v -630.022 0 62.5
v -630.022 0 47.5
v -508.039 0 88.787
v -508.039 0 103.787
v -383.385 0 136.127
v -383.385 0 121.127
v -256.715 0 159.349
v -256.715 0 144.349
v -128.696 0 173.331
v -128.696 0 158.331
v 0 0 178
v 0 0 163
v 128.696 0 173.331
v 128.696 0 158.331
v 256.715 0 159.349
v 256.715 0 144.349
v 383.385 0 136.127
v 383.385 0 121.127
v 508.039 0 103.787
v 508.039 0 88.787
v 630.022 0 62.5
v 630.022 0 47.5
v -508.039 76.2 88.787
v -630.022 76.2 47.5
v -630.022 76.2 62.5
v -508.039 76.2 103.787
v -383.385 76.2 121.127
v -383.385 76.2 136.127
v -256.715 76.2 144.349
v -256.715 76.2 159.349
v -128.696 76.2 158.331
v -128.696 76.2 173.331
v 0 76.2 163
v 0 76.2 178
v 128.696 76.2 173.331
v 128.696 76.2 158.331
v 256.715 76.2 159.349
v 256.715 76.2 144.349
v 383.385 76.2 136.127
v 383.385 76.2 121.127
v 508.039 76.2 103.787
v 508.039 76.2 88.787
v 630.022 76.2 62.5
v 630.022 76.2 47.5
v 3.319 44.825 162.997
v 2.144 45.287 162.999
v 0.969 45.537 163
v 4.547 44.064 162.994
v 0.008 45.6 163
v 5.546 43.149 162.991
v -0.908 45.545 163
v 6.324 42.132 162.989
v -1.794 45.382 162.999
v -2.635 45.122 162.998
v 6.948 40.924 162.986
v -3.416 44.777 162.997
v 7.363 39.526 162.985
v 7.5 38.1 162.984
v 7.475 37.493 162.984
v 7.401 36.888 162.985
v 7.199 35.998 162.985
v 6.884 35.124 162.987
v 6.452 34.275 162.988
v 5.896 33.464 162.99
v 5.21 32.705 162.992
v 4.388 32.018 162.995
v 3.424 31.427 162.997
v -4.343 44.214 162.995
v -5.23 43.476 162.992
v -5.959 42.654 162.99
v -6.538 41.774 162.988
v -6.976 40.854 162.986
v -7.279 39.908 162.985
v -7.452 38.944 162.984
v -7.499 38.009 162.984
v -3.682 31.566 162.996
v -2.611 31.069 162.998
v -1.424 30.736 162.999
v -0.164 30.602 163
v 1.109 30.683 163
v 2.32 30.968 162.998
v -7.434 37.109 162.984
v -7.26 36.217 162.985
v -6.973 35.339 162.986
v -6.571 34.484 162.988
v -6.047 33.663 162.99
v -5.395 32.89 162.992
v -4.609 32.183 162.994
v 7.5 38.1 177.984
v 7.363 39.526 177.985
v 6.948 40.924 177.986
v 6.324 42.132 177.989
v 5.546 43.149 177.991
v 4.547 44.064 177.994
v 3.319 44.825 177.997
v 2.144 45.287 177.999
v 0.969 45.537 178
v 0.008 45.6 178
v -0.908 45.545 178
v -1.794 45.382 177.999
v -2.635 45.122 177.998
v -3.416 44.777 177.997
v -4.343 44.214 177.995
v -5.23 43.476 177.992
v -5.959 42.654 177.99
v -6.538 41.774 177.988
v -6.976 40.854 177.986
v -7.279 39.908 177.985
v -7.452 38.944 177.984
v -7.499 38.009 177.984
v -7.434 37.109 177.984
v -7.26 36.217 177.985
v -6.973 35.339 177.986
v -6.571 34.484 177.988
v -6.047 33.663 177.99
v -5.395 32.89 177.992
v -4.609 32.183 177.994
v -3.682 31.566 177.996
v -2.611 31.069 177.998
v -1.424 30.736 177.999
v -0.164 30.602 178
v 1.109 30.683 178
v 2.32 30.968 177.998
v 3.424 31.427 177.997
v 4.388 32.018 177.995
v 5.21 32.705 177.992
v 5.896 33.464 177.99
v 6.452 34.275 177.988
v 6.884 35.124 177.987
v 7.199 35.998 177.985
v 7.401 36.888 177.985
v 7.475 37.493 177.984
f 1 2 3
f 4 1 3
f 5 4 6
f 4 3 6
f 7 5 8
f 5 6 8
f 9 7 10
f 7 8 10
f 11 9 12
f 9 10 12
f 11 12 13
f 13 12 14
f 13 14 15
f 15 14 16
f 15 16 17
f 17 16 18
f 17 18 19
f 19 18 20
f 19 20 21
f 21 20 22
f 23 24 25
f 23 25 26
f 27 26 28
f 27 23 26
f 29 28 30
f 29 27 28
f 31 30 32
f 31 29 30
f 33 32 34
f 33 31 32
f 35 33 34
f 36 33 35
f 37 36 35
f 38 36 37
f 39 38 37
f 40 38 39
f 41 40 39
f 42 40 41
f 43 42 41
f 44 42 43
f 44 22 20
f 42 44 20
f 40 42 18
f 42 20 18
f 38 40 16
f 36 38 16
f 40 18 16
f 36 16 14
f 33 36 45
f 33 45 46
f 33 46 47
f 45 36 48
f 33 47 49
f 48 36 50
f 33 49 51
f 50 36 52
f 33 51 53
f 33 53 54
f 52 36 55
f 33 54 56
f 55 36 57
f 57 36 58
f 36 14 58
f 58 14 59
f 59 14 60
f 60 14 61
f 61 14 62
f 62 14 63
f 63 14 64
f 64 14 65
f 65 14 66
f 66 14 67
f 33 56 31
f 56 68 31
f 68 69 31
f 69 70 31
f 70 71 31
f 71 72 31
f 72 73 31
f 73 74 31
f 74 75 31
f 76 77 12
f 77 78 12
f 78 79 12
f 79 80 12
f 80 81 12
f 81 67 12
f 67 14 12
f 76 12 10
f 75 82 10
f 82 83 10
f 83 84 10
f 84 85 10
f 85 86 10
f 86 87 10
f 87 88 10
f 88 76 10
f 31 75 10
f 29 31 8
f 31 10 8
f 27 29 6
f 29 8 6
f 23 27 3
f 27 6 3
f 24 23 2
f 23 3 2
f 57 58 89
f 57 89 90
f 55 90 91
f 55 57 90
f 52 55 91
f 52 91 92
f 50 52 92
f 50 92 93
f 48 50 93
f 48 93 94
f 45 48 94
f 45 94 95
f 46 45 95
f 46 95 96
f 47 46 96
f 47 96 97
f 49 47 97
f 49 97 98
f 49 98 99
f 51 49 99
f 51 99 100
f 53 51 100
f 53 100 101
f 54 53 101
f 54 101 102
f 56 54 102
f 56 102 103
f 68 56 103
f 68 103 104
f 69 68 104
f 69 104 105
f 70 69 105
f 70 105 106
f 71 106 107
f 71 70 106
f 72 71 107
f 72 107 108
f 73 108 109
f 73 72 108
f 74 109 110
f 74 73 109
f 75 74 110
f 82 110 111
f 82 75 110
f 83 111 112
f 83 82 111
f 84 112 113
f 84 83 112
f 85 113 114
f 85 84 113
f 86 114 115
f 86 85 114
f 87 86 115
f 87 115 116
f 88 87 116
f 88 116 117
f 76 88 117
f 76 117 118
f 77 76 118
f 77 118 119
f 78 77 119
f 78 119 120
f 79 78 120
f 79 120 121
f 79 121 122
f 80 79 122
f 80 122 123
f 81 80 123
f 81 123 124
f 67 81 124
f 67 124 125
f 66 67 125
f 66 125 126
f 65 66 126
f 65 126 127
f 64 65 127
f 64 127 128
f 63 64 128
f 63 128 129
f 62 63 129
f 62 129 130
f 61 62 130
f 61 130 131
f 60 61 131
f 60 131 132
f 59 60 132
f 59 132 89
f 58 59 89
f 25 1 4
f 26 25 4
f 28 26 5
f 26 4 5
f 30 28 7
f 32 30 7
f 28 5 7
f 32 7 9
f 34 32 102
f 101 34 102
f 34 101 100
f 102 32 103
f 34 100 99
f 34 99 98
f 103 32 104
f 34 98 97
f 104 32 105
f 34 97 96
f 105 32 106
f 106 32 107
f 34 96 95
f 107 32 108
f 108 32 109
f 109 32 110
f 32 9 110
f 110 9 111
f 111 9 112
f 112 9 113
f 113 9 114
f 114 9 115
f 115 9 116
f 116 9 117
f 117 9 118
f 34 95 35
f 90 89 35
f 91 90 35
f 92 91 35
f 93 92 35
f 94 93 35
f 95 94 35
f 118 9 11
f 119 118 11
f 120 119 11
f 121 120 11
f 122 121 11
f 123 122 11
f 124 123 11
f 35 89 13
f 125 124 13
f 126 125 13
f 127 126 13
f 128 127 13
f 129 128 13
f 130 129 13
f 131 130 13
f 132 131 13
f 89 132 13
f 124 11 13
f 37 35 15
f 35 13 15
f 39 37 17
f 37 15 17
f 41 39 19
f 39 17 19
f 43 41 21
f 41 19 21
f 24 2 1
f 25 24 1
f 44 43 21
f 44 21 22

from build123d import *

# Parameters (mm, degrees)
BOSS_EXTRUDE1_DEPTH = 76.2
SKETCH7_R           = 7.5
CUT_EXTRUDE1_DEPTH  = 179


with BuildPart() as part:
    # Sketch1 → Boss-Extrude1 (new body)
    with BuildSketch(Plane(origin=(0, 0, 0), x_dir=(1, 0, 0), z_dir=(0, 1, 0))):
        with BuildLine():
            Line((-630.021699517, -47.499985829), (-630.021699517, -62.499985829))
            ThreePointArc((-630.021699517, -62.499985829), (0, -178), (630.021699517, -62.499985829))
            Line((630.021699517, -62.499985829), (630.021699517, -47.499985829))
            ThreePointArc((630.021699517, -47.499985829), (0, -163), (-630.021699517, -47.499985829))
        make_face()
    extrude(amount=BOSS_EXTRUDE1_DEPTH)

    # Sketch7 → Cut-Extrude1 (cut, through all)
    with BuildSketch(Plane.XY):
        with Locations((0, 38.1)):
            Circle(SKETCH7_R)
    extrude(amount=CUT_EXTRUDE1_DEPTH, mode=Mode.SUBTRACT)


solid = part.part
